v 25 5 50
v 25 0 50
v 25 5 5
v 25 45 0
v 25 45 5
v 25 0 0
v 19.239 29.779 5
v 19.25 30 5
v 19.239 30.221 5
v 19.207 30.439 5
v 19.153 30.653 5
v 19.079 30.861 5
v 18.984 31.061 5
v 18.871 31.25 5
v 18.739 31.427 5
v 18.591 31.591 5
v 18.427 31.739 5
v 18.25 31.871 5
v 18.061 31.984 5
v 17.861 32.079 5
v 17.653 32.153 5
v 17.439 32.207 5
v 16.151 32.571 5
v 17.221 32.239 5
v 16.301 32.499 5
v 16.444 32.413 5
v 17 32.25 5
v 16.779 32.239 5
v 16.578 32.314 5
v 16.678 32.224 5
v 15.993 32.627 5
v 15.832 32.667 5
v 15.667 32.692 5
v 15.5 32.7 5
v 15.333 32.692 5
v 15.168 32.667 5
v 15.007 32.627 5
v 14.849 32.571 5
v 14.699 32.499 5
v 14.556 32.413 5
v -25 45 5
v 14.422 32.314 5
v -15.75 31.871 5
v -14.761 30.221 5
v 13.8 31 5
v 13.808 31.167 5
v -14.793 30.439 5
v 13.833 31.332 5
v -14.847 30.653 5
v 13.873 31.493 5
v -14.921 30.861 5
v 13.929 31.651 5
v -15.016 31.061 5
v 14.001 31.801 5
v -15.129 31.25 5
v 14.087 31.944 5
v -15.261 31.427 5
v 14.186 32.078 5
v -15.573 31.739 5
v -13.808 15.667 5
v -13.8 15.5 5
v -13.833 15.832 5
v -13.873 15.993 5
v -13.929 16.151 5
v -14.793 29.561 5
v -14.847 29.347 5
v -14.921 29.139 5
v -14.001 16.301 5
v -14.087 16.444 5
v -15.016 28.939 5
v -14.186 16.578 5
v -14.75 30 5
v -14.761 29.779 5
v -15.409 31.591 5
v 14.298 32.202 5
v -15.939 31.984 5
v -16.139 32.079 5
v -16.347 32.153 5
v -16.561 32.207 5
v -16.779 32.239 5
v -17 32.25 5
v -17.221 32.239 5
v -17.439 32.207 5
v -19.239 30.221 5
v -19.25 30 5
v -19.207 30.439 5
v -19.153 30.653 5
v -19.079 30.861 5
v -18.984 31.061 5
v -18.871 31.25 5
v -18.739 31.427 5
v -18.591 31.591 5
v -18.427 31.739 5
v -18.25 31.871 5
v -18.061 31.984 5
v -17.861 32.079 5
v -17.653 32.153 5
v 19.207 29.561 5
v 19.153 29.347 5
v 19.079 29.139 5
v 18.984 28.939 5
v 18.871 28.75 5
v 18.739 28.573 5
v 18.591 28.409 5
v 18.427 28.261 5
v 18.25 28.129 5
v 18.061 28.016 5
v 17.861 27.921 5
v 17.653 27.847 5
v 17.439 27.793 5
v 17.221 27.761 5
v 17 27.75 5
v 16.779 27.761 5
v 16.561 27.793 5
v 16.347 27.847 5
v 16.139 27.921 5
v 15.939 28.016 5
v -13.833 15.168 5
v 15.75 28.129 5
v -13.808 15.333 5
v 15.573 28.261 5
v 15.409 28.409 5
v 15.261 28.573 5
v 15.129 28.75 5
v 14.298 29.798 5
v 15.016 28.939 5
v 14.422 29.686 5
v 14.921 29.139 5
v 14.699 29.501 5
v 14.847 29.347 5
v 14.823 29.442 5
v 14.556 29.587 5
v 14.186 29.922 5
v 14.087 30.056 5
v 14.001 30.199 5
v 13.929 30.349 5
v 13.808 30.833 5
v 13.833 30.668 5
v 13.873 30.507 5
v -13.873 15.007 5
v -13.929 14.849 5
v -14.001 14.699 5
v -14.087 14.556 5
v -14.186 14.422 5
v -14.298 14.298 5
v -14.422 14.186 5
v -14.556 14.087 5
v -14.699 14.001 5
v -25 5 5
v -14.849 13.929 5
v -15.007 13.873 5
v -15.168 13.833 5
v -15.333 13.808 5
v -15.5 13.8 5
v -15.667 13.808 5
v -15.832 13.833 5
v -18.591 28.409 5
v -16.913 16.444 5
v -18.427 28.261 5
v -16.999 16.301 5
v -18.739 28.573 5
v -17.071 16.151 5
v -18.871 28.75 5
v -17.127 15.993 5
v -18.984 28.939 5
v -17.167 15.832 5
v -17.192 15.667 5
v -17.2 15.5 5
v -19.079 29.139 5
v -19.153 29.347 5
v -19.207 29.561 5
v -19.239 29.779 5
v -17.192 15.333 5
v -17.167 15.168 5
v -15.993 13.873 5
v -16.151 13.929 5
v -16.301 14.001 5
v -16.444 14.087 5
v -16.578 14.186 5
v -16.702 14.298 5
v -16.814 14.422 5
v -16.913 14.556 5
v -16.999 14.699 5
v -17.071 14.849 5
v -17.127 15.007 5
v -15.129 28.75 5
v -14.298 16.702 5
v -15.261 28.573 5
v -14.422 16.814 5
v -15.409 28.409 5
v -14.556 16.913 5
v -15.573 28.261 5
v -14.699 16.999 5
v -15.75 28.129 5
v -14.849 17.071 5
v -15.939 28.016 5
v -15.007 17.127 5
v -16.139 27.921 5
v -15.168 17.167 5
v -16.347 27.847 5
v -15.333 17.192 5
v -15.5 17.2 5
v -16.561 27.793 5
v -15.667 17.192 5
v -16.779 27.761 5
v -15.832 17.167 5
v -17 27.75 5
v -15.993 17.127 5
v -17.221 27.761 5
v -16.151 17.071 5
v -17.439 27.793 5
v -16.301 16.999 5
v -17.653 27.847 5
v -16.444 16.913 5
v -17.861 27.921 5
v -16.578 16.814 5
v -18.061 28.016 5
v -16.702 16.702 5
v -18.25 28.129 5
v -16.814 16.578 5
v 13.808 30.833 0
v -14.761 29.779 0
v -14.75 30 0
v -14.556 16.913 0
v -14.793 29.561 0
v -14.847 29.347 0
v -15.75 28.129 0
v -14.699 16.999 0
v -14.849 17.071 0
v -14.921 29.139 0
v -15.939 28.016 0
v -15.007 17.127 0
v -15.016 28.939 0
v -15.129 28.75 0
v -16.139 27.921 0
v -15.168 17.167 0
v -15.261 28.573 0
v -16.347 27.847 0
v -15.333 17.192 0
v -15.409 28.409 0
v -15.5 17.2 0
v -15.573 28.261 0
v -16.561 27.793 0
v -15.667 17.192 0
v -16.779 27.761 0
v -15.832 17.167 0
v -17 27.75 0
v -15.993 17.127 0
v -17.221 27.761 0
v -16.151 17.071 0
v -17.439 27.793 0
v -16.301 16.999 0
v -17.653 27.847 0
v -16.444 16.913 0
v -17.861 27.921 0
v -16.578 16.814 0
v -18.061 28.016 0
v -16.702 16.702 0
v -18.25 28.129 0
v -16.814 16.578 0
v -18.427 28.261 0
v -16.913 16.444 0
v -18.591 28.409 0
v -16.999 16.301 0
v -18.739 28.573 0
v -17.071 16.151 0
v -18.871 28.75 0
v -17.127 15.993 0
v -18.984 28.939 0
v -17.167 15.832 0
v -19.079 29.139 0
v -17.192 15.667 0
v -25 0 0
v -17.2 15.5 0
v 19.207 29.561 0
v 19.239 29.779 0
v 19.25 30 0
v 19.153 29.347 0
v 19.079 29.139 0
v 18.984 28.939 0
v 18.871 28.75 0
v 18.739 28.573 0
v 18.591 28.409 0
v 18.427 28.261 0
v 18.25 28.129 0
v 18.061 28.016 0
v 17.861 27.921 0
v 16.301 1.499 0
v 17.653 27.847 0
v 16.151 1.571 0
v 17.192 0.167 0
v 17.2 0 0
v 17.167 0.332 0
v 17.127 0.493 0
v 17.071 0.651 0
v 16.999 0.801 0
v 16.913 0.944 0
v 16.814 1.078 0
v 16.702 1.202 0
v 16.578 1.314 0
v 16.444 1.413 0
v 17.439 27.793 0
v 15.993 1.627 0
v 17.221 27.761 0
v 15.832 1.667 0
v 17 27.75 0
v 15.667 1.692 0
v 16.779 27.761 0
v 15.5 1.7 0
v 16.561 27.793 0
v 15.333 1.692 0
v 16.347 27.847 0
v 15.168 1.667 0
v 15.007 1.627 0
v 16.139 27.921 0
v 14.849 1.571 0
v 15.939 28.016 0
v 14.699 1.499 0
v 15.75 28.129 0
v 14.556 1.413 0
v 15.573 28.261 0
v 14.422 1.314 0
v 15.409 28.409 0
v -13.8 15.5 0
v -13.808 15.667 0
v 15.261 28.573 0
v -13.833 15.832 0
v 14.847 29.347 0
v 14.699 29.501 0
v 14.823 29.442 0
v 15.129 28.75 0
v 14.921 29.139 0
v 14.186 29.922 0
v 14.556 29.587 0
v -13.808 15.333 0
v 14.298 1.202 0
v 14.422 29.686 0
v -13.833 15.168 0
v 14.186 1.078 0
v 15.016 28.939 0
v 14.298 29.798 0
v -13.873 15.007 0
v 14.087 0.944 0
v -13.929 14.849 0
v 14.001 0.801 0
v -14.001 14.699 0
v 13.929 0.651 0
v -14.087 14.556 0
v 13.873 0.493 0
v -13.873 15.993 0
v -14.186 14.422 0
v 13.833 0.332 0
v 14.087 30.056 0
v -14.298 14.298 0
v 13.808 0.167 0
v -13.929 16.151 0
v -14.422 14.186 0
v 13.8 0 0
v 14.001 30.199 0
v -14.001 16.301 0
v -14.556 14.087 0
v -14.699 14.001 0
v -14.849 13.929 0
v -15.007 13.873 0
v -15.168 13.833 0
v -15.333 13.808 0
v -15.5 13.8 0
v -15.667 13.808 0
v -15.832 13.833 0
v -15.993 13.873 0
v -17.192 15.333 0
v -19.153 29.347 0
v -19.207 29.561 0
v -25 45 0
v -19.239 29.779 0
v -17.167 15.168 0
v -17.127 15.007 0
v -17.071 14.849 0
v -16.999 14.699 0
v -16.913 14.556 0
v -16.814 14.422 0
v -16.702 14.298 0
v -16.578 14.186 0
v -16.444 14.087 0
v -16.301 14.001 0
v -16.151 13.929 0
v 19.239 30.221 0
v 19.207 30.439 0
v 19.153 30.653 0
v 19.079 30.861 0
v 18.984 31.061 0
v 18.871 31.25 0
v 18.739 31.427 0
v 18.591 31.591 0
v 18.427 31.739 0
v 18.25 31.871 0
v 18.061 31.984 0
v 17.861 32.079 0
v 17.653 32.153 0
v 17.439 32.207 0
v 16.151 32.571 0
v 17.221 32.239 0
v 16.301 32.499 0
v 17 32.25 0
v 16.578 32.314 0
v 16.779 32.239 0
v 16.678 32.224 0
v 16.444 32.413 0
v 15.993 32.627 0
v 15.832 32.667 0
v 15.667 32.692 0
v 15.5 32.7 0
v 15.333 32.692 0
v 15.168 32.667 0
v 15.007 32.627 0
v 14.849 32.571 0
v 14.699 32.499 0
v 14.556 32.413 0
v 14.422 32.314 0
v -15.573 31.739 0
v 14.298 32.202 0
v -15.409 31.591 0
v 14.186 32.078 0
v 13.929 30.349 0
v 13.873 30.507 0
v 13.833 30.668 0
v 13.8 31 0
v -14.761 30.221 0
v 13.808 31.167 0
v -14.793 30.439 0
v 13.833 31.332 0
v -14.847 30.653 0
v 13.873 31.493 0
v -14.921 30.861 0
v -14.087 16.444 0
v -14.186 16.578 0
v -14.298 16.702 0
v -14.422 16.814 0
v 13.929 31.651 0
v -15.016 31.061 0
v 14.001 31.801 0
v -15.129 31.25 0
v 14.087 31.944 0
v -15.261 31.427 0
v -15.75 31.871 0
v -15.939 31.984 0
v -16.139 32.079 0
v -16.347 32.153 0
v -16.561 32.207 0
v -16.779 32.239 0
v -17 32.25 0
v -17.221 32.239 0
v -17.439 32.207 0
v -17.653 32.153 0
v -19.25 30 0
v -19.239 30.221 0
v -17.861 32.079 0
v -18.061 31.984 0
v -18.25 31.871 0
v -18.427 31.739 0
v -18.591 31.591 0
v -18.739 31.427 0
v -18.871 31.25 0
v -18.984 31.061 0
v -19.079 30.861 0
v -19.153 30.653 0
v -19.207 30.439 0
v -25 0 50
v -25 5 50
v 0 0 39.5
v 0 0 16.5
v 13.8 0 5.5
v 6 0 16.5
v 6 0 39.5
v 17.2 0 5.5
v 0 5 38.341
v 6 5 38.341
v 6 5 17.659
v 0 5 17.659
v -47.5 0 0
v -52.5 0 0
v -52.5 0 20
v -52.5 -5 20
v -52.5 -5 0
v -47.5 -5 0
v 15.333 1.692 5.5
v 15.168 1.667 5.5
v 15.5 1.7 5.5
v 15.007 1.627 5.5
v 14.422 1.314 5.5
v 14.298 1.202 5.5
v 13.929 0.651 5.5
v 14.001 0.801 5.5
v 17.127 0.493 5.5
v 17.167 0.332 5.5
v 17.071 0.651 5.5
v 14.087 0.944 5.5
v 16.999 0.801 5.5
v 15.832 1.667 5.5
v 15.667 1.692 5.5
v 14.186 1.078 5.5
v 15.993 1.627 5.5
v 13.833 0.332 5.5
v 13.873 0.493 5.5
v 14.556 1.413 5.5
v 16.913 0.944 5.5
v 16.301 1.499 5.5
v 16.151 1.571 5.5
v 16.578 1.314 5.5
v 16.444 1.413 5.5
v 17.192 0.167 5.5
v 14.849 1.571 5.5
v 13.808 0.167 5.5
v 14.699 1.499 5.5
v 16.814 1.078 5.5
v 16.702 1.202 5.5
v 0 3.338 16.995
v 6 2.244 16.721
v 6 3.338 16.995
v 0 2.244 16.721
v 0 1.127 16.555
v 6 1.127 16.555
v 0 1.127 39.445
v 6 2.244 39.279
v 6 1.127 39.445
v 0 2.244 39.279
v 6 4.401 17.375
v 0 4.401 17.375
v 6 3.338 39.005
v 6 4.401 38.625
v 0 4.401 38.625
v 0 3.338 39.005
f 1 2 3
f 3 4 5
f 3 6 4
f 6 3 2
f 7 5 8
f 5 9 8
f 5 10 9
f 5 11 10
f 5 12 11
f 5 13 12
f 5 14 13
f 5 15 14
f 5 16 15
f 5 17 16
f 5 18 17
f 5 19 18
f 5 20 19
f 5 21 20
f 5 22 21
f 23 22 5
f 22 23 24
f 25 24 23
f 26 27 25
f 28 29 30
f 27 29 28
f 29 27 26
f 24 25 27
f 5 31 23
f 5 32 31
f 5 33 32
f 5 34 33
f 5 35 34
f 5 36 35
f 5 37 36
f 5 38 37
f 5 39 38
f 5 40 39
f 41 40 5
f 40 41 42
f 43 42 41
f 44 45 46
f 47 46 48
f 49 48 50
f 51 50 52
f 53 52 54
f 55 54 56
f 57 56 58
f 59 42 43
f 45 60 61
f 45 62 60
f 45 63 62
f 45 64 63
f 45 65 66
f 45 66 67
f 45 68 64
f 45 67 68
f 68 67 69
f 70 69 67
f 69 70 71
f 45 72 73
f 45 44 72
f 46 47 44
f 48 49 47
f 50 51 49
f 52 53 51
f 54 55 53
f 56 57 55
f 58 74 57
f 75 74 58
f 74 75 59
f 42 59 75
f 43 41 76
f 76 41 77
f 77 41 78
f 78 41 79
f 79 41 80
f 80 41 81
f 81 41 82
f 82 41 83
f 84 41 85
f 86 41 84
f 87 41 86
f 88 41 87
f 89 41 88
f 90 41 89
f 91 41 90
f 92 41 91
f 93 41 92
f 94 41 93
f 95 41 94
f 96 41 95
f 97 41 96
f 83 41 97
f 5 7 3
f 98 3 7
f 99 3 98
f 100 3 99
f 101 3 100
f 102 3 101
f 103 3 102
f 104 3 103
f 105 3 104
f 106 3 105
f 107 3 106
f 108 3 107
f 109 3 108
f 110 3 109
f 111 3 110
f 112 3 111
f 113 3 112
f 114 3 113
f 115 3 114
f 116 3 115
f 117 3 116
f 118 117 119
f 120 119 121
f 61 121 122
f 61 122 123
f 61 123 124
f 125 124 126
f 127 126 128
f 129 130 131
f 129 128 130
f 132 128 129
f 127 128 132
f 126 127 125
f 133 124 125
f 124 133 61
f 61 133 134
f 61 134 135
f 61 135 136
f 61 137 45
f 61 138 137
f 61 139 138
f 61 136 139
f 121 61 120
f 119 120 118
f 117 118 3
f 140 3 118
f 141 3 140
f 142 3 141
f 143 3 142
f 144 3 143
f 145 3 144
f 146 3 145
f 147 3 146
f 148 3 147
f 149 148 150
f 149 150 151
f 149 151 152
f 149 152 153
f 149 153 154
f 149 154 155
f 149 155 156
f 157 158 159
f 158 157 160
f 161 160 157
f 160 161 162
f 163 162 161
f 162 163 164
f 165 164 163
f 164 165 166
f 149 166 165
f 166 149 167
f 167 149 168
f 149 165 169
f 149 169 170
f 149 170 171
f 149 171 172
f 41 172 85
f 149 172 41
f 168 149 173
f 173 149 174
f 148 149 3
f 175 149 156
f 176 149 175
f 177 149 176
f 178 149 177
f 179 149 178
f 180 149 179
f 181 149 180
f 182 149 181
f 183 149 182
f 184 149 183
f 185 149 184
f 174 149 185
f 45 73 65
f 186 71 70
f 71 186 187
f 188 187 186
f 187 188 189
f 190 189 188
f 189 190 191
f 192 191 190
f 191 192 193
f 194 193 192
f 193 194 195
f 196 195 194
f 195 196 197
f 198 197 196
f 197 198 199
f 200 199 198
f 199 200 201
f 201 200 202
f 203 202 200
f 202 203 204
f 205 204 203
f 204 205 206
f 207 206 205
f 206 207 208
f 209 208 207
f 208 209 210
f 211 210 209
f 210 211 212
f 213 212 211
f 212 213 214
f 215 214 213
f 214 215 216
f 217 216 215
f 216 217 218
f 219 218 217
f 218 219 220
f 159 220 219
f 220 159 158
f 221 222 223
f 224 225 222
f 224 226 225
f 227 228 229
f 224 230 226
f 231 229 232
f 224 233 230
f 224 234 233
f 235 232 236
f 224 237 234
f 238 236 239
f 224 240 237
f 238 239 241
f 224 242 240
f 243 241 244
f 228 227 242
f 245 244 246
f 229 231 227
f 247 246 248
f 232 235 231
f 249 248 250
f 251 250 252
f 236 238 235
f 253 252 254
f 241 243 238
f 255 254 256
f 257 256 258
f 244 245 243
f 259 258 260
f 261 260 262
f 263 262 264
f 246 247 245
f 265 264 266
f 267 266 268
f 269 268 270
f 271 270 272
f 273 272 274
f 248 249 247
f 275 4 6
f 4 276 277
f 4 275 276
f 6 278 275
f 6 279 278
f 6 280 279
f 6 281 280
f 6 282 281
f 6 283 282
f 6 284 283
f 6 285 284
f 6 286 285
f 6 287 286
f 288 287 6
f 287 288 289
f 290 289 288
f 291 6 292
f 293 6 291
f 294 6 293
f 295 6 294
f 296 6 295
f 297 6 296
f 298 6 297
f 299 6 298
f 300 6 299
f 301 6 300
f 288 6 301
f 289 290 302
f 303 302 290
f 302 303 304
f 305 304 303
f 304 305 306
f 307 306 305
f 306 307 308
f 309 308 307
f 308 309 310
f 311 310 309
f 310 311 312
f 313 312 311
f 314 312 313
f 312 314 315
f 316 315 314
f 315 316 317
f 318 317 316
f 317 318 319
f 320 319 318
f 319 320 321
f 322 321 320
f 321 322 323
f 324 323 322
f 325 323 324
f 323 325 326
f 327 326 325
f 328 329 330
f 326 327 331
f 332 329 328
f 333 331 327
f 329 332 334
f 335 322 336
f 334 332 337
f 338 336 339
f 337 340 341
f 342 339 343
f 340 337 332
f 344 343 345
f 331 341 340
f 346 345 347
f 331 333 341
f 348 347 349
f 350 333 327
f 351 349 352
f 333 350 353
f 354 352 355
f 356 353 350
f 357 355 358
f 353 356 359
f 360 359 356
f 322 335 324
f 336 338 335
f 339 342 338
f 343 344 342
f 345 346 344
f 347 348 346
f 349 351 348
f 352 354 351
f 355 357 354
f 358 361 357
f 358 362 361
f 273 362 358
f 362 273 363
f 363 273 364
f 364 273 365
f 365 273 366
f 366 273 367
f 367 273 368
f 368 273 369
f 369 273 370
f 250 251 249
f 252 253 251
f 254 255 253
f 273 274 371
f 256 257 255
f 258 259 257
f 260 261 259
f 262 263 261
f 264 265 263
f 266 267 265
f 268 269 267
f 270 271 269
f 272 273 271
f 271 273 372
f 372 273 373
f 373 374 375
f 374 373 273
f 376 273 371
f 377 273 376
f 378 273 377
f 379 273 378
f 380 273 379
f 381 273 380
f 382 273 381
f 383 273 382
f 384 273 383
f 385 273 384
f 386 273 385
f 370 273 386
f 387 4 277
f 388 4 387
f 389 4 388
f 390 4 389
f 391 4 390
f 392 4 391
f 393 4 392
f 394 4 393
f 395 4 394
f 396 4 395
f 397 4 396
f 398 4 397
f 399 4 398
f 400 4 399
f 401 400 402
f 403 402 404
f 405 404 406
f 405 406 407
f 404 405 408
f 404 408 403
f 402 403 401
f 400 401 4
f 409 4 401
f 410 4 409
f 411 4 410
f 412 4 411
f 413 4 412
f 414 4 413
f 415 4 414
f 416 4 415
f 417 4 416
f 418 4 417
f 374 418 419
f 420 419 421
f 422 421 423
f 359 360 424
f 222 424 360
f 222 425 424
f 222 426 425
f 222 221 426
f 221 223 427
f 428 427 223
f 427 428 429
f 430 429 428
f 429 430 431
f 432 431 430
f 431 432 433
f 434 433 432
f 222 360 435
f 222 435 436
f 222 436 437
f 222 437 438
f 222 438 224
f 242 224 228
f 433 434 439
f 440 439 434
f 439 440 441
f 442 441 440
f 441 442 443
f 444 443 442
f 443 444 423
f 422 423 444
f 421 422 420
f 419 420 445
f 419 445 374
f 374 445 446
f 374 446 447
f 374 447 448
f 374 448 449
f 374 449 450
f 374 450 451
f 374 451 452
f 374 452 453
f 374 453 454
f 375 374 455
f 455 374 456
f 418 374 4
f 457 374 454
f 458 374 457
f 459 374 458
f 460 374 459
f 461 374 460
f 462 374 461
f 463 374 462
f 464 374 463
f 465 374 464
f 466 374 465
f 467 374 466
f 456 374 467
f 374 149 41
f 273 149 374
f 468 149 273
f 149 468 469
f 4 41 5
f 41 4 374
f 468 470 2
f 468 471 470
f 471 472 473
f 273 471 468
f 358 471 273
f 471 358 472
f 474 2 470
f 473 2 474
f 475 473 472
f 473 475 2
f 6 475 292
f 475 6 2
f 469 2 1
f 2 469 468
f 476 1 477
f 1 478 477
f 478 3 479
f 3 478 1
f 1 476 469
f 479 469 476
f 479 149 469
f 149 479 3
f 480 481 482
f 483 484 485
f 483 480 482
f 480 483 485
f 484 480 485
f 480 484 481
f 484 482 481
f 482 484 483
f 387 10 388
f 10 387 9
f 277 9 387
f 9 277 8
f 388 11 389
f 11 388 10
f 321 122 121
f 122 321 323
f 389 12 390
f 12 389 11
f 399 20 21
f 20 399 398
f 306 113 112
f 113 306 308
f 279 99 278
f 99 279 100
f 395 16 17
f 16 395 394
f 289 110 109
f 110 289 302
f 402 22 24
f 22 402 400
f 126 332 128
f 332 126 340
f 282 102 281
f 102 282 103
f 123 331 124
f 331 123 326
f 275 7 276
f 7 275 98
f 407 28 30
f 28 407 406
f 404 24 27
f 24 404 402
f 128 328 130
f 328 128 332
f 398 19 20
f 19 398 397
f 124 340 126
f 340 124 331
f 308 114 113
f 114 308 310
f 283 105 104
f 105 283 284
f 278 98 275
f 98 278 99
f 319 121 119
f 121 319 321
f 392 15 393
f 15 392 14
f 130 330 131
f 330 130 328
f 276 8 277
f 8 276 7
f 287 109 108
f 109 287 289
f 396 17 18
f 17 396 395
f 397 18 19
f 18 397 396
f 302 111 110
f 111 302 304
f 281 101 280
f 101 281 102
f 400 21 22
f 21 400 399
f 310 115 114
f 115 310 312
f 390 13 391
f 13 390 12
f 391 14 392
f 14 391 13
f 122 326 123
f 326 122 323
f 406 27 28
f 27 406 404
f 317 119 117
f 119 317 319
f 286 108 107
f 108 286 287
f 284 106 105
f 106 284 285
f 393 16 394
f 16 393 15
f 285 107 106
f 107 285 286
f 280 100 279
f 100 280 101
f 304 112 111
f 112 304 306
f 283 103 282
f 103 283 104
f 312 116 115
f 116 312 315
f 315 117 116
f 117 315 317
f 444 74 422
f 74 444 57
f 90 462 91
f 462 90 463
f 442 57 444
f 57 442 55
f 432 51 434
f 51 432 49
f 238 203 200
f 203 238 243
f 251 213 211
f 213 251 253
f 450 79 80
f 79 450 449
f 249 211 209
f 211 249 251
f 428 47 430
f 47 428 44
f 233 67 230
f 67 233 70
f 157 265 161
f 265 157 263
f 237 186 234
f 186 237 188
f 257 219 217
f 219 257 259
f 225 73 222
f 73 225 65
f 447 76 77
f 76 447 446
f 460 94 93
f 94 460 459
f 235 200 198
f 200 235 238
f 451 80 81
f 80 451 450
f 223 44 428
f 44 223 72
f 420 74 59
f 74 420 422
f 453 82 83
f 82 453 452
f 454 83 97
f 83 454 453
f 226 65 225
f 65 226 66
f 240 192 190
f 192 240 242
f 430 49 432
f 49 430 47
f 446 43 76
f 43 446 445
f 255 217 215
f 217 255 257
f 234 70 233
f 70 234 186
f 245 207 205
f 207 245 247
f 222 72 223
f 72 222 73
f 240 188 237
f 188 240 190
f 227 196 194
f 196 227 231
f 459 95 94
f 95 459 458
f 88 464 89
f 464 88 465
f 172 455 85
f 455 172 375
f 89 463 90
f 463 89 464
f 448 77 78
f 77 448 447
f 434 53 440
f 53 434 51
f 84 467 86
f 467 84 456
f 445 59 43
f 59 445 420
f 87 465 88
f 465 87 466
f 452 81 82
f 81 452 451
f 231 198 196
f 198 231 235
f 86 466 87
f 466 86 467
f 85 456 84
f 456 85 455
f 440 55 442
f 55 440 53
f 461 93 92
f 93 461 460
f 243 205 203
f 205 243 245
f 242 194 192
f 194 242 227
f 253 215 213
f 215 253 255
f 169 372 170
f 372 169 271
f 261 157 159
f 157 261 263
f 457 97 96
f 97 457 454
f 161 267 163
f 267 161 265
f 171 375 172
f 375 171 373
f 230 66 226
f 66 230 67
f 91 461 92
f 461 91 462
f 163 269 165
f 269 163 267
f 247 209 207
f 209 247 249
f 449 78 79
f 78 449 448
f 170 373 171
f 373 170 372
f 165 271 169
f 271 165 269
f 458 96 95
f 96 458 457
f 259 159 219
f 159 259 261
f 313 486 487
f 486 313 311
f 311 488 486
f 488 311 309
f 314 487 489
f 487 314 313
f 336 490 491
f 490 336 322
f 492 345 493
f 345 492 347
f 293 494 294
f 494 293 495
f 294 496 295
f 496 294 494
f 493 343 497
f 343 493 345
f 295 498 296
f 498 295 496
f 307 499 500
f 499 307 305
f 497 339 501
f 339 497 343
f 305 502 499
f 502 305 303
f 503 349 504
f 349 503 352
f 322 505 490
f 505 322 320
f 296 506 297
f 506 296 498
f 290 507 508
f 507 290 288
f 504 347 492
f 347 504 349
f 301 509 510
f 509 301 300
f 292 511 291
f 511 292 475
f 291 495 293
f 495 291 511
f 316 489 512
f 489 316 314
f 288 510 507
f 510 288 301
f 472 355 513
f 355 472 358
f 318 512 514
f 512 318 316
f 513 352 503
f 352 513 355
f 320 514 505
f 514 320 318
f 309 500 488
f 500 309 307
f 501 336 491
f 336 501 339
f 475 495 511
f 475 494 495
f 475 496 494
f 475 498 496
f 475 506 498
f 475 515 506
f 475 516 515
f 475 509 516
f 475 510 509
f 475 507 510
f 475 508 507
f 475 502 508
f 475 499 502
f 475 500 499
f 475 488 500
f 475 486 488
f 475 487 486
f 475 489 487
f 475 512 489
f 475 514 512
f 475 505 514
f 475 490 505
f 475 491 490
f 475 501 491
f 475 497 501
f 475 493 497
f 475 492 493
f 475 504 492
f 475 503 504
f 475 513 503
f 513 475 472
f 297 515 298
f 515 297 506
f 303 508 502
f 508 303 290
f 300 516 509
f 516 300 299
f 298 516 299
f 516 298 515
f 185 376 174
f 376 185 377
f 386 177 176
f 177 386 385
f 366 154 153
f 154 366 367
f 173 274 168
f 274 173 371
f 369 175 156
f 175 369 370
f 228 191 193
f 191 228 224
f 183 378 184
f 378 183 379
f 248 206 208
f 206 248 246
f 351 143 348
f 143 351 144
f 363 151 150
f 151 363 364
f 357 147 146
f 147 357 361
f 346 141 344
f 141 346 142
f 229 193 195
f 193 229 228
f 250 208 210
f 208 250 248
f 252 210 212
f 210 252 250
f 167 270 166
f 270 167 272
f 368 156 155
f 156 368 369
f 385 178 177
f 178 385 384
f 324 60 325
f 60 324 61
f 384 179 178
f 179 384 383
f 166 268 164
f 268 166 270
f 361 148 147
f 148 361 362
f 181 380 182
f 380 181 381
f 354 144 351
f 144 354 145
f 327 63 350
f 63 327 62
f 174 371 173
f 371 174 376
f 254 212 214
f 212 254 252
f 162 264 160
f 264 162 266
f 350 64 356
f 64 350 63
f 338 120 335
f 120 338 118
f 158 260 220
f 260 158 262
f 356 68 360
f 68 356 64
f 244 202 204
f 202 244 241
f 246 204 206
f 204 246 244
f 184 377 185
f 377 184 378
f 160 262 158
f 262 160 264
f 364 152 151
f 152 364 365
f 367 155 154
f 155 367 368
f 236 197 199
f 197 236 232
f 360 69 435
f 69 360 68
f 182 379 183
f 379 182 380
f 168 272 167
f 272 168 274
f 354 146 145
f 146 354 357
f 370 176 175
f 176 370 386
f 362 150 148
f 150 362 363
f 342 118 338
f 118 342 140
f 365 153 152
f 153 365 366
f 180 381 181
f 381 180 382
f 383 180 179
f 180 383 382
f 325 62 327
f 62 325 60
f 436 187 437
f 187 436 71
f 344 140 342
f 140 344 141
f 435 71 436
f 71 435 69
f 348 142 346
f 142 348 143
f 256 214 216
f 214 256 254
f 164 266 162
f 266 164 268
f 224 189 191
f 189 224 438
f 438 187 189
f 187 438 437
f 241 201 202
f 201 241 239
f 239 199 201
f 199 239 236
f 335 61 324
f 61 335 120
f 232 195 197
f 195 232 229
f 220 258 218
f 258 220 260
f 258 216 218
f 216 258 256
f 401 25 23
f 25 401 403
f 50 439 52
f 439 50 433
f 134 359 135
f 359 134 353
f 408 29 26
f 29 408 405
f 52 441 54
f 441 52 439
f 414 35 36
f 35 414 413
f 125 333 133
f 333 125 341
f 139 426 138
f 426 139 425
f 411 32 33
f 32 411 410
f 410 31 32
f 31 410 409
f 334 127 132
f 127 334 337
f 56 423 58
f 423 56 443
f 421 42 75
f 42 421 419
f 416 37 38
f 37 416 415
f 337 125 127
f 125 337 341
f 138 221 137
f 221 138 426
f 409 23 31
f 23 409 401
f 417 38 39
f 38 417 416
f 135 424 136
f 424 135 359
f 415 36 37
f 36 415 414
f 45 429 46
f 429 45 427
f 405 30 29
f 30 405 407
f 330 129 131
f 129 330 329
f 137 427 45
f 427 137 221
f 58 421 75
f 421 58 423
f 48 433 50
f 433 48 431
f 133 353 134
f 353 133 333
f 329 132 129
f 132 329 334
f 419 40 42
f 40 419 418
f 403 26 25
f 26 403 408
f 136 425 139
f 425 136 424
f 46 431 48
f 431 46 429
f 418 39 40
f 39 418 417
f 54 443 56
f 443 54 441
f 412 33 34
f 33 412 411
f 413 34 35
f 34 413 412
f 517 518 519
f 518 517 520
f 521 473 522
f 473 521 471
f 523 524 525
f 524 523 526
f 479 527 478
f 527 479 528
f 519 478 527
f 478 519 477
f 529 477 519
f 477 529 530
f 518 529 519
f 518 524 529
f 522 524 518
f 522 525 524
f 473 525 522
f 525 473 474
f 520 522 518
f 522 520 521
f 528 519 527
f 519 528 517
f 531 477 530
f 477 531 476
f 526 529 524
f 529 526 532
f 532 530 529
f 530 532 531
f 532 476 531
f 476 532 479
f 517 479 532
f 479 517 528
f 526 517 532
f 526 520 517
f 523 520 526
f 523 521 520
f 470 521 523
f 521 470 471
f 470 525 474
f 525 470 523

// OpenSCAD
// L-shaped mounting bracket for NEMA 17 stepper motor (e.g. syringe pump)
// Print orientation: base plate on bed, motor plate builds upward (+Z)

$fn = 64;

// ---- Base plate ----
base_x0 = -25;   // base plate: x start
base_x1 = 25;    // base plate: x end
base_y0 = 0;     // base plate: y start
base_y1 = 45;    // base plate: y end
base_z0 = 0;     // base plate: z start
base_z1 = 5;     // base plate: z end

// ---- Motor plate ----
motor_x0 = -25;  // motor plate: x start
motor_x1 = 25;   // motor plate: x end
motor_y0 = 0;    // motor plate: y start
motor_y1 = 5;    // motor plate: y end
motor_z0 = 0;    // motor plate: z start
motor_z1 = 50;   // motor plate: z end

// ---- Through-holes (base plate) ----
hole_x = -17;    // hole x position (left)
hole_y = 30;     // hole y position
hole_d = 4.5;    // hole diameter (M4)

// ---- Motor boss hole ----
boss_d  = 23;    // boss hole diameter (along Y)
boss_x  = 0;     // boss hole centre x
boss_z  = 28;    // boss hole centre z

// ---- Screw holes ----
screw_d  = 3.4;  // screw hole diameter (M3)
screw_n  = 4;    // number of screw holes
screw_p  = 31;   // square pattern pitch
screw_x0 = -15.5; // first screw x (counter-clockwise from +X axis)
screw_z0 = -15.5; // first screw z

// ---- Gussets ----
gusset_t = 5;    // gusset thickness (X)
gusset_l = 20;   // gusset leg length (Y and Z)
gusset_x0 = -25; // gusset left edge x
gusset_x1 = -20; // gusset right edge x

// ---- Misc ----
eps = 0.5;       // cutter overshoot past faces

difference() {
    union() {
        // Base plate
        translate([base_x0, base_y0, base_z0])
            cube([base_x1 - base_x0, base_y1 - base_y0, base_z1 - base_z0]);

        // Motor plate
        translate([motor_x0, motor_y0, motor_z0])
            cube([motor_x1 - motor_x0, motor_y1 - motor_y0, motor_z1 - motor_z0]);

        // Gussets: right triangles in YZ plane, flush with left edge
        translate([gusset_x0, 0, 0])
            rotate([90, 0, 0])
                linear_extrude(height = gusset_t)
                    polygon(points = [
                        [gusset_x0 - (gusset_x1 - gusset_x0) / 2, gusset_l],
                        [gusset_x0 - (gusset_x1 - gusset_x0) / 2, 0],
                        [gusset_x1 - (gusset_x1 - gusset_x0) / 2, 0]
                    ]);
    }

    // Base plate through-holes
    for (sx = [-1, 1])
        translate([sx * hole_x, hole_y, -eps])
            cylinder(d = hole_d, h = base_z1 - base_z0 + 2 * eps);

    // Motor boss hole
    translate([boss_x, 0, boss_z])
        rotate([0, 90, 0])
            cylinder(d = boss_d, h = motor_y1 - motor_y0 + 2 * eps);

    // Screw holes on square pattern
    for (i = [0 : screw_n - 1]) {
        angle = i * 90;
        translate([screw_x0 + (i % 2) * screw_p,
                   screw_z0 + (i / 2) * screw_p,
                   -eps])
            rotate([0, 0, angle])
                cylinder(d = screw_d, h = motor_y1 - motor_y0 + 2 * eps);
    }
}
